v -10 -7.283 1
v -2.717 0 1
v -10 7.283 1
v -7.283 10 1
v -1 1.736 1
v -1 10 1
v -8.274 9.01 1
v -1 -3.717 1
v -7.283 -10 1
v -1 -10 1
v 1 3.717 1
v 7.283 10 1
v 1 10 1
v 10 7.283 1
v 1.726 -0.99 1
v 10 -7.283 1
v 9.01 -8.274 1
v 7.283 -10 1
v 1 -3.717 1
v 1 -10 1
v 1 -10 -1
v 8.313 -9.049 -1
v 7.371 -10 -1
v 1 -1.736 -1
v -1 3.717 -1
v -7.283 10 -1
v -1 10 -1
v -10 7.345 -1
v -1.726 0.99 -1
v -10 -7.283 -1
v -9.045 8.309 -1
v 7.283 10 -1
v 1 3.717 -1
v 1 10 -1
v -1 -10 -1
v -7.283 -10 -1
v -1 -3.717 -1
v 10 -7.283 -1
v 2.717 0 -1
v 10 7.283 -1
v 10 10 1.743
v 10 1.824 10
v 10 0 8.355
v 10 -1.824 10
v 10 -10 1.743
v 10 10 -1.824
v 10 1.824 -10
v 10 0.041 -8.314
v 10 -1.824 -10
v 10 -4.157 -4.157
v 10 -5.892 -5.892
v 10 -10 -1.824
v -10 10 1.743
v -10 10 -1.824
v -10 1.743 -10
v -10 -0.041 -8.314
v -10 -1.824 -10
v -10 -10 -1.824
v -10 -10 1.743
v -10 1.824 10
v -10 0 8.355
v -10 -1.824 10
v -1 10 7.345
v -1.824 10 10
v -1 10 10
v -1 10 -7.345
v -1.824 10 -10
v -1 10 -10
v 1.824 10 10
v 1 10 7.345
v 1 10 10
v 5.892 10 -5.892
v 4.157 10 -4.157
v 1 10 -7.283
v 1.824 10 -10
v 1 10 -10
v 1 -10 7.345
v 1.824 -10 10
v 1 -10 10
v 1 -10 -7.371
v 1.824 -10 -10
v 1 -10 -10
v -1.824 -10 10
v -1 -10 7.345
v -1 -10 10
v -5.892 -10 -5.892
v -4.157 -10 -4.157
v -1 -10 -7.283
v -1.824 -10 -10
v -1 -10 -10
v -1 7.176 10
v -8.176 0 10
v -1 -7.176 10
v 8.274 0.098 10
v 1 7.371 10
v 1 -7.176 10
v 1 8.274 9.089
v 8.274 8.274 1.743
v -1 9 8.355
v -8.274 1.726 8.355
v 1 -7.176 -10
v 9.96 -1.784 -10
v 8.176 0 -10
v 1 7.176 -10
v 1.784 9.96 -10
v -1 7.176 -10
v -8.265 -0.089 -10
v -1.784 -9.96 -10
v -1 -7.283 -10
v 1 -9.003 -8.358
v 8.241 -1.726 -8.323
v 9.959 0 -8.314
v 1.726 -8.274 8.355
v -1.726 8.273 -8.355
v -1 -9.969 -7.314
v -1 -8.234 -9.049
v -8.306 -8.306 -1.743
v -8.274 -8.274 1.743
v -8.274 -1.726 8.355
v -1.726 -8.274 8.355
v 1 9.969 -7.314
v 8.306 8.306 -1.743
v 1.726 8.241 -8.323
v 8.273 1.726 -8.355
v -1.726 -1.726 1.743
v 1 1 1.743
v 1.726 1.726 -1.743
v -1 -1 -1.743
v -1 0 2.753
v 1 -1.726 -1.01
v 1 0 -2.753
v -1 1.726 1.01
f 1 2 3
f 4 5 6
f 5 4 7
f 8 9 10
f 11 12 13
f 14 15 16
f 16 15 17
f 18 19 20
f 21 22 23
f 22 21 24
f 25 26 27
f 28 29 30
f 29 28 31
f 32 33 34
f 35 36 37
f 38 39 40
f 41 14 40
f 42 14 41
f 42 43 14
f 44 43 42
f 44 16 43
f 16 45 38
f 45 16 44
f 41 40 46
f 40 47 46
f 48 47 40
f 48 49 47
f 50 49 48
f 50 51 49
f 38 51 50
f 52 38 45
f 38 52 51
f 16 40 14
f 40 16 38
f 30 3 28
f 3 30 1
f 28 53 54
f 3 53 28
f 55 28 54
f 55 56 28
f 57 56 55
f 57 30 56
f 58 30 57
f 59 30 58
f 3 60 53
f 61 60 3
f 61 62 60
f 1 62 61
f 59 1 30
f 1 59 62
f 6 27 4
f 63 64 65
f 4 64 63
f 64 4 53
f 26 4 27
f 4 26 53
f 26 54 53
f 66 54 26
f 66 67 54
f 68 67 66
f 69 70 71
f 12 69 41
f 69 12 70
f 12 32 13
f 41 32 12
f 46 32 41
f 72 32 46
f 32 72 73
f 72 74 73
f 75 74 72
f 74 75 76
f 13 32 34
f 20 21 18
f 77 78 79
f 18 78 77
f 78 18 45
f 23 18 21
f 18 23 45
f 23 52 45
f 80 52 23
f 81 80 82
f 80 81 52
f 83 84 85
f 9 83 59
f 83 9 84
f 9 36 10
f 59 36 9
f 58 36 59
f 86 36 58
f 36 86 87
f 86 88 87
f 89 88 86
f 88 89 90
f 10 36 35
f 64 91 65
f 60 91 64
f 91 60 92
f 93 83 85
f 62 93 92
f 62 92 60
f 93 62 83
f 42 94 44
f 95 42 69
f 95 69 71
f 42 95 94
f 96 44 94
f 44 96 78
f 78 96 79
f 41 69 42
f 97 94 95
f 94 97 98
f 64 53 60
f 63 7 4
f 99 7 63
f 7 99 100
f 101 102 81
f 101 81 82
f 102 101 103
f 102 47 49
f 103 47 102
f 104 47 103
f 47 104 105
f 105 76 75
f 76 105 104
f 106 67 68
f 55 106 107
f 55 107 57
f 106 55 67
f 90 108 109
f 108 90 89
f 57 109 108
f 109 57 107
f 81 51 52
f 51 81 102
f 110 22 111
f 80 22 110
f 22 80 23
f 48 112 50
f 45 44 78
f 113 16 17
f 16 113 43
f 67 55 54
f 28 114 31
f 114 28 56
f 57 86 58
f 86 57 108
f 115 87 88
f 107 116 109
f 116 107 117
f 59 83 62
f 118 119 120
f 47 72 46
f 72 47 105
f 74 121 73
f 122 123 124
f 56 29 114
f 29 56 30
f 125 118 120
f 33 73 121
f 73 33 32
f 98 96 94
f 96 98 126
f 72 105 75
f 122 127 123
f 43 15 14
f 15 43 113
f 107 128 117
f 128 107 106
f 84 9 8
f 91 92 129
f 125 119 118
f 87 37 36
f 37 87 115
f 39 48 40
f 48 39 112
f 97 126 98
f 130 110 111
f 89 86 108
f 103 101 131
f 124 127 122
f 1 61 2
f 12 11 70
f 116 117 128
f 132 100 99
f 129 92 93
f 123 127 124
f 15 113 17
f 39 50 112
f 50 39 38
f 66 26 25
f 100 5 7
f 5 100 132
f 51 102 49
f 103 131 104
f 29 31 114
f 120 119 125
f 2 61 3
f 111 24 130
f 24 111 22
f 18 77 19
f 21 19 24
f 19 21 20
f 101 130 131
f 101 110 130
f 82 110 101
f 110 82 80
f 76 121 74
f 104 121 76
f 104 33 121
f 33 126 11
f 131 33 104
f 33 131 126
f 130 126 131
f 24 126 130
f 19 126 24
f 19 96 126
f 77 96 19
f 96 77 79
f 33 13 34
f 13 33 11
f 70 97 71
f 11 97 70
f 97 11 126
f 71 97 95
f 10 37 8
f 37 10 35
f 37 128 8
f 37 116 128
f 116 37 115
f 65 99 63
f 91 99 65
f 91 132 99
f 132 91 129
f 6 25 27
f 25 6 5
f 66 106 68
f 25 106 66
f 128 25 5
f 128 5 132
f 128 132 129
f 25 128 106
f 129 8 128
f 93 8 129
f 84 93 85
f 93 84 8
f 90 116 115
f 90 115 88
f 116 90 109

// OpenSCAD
cube_size=20; 
thickness_of_plate=2;
frag="YES";
whole=0;

//Face Centered Cubic
module HexPlate(cube_size,thickness_of_plate,ZRotate){
intersection(){
        cube(cube_size,center=true);
        rotate([0,-55,ZRotate]) cube([cube_size*sqrt(2),cube_size*sqrt(2),thickness_of_plate],center=true);
    }
}

module TrianglePlate(cube_size,thickness_of_plate){
    intersection(){
        cube(cube_size,center=true);
        translate([10,10,0]) rotate([55,0,135]) cube([2*cube_size*sqrt(2),2*cube_size*sqrt(2),thickness_of_plate],center=true);
    }
}

module plate(XRotate,YRotate,cube_size,plate_width){
    intersection(){
        rotate([XRotate,YRotate,0]) cube([(2.5*cube_size),(2.5*cube_size),plate_width],center=true);
        cube(cube_size,center=true);
    }
}

if(frag=="YES"){
z=12-whole;
difference(){
    union(){
        for(k=[1:z]){
            if(k==15) plate(0,90,cube_size,thickness_of_plate);
            if(k==14) plate(90,90,cube_size,thickness_of_plate);
            if(k==13) HexPlate(cube_size,thickness_of_plate,45);
            if(k==12) HexPlate(cube_size,thickness_of_plate,225);
            if(k==11) HexPlate(cube_size,thickness_of_plate,135);
            if(k==10) HexPlate(cube_size,thickness_of_plate,315);
            //TRIANGULAR PLATES
            if(k==9) rotate([0,90,0]) TrianglePlate(cube_size,thickness_of_plate);
            if(k==8) rotate([0,0,-180]) TrianglePlate(cube_size,thickness_of_plate);
            if(k==7) rotate([0,90,-180]) TrianglePlate(cube_size,thickness_of_plate);
            if(k==6) TrianglePlate(cube_size,thickness_of_plate);
            if(k==5) rotate([0,90,90]) TrianglePlate(cube_size,thickness_of_plate);
            if(k==4) rotate([0,0,-90]) TrianglePlate(cube_size,thickness_of_plate);
            if(k==3) rotate([0,90,-90]) TrianglePlate(cube_size,thickness_of_plate);
            if(k==2) rotate([0,0,90]) TrianglePlate(cube_size,thickness_of_plate);
            if(k==1) plate(0,0,cube_size,thickness_of_plate);
        }
    }
    union(){
        for(x=[1:whole]){
            if(x==1) plate(0,90,cube_size,thickness_of_plate);
            if(x==2) plate(90,90,cube_size,thickness_of_plate);
            if(x==3) HexPlate(cube_size,thickness_of_plate,45);
            if(x==4) HexPlate(cube_size,thickness_of_plate,225);
            if(x==5) HexPlate(cube_size,thickness_of_plate,135);
            if(x==6) HexPlate(cube_size,thickness_of_plate,315);
            //TRIANGULAR PLATES
            if(x==7) rotate([0,90,0]) TrianglePlate(cube_size,thickness_of_plate);
            if(x==8) rotate([0,0,-180]) TrianglePlate(cube_size,thickness_of_plate);
            if(x==9) rotate([0,90,-180]) TrianglePlate(cube_size,thickness_of_plate);
            if(x==10) TrianglePlate(cube_size,thickness_of_plate);
            if(x==11) rotate([0,90,90]) TrianglePlate(cube_size,thickness_of_plate);
            if(x==12) rotate([0,0,-90]) TrianglePlate(cube_size,thickness_of_plate);
            if(x==13) rotate([0,90,-90]) TrianglePlate(cube_size,thickness_of_plate);
            if(x==14) rotate([0,0,90]) TrianglePlate(cube_size,thickness_of_plate);
            if(x==15) plate(0,0,cube_size,thickness_of_plate);
        }
    }
}
}

if(frag=="NO"){
    for(x=[1:whole]){
        if(x==1) plate(0,90,cube_size,thickness_of_plate);
        if(x==2) plate(90,90,cube_size,thickness_of_plate);
        if(x==3) HexPlate(cube_size,thickness_of_plate,45);
        if(x==4) HexPlate(cube_size,thickness_of_plate,225);
        if(x==5) HexPlate(cube_size,thickness_of_plate,135);
        if(x==6) HexPlate(cube_size,thickness_of_plate,315);
        //TRIANGULAR PLATES
        if(x==7) rotate([0,90,0]) TrianglePlate(cube_size,thickness_of_plate);
        if(x==8) rotate([0,0,-180]) TrianglePlate(cube_size,thickness_of_plate);
        if(x==9) rotate([0,90,-180]) TrianglePlate(cube_size,thickness_of_plate);
        if(x==10) TrianglePlate(cube_size,thickness_of_plate);
        if(x==11) rotate([0,90,90]) TrianglePlate(cube_size,thickness_of_plate);
        if(x==12) rotate([0,0,-90]) TrianglePlate(cube_size,thickness_of_plate);
        if(x==13) rotate([0,90,-90]) TrianglePlate(cube_size,thickness_of_plate);
        if(x==14) rotate([0,0,90]) TrianglePlate(cube_size,thickness_of_plate);
        if(x==15) plate(0,0,cube_size,thickness_of_plate);
    }
}
